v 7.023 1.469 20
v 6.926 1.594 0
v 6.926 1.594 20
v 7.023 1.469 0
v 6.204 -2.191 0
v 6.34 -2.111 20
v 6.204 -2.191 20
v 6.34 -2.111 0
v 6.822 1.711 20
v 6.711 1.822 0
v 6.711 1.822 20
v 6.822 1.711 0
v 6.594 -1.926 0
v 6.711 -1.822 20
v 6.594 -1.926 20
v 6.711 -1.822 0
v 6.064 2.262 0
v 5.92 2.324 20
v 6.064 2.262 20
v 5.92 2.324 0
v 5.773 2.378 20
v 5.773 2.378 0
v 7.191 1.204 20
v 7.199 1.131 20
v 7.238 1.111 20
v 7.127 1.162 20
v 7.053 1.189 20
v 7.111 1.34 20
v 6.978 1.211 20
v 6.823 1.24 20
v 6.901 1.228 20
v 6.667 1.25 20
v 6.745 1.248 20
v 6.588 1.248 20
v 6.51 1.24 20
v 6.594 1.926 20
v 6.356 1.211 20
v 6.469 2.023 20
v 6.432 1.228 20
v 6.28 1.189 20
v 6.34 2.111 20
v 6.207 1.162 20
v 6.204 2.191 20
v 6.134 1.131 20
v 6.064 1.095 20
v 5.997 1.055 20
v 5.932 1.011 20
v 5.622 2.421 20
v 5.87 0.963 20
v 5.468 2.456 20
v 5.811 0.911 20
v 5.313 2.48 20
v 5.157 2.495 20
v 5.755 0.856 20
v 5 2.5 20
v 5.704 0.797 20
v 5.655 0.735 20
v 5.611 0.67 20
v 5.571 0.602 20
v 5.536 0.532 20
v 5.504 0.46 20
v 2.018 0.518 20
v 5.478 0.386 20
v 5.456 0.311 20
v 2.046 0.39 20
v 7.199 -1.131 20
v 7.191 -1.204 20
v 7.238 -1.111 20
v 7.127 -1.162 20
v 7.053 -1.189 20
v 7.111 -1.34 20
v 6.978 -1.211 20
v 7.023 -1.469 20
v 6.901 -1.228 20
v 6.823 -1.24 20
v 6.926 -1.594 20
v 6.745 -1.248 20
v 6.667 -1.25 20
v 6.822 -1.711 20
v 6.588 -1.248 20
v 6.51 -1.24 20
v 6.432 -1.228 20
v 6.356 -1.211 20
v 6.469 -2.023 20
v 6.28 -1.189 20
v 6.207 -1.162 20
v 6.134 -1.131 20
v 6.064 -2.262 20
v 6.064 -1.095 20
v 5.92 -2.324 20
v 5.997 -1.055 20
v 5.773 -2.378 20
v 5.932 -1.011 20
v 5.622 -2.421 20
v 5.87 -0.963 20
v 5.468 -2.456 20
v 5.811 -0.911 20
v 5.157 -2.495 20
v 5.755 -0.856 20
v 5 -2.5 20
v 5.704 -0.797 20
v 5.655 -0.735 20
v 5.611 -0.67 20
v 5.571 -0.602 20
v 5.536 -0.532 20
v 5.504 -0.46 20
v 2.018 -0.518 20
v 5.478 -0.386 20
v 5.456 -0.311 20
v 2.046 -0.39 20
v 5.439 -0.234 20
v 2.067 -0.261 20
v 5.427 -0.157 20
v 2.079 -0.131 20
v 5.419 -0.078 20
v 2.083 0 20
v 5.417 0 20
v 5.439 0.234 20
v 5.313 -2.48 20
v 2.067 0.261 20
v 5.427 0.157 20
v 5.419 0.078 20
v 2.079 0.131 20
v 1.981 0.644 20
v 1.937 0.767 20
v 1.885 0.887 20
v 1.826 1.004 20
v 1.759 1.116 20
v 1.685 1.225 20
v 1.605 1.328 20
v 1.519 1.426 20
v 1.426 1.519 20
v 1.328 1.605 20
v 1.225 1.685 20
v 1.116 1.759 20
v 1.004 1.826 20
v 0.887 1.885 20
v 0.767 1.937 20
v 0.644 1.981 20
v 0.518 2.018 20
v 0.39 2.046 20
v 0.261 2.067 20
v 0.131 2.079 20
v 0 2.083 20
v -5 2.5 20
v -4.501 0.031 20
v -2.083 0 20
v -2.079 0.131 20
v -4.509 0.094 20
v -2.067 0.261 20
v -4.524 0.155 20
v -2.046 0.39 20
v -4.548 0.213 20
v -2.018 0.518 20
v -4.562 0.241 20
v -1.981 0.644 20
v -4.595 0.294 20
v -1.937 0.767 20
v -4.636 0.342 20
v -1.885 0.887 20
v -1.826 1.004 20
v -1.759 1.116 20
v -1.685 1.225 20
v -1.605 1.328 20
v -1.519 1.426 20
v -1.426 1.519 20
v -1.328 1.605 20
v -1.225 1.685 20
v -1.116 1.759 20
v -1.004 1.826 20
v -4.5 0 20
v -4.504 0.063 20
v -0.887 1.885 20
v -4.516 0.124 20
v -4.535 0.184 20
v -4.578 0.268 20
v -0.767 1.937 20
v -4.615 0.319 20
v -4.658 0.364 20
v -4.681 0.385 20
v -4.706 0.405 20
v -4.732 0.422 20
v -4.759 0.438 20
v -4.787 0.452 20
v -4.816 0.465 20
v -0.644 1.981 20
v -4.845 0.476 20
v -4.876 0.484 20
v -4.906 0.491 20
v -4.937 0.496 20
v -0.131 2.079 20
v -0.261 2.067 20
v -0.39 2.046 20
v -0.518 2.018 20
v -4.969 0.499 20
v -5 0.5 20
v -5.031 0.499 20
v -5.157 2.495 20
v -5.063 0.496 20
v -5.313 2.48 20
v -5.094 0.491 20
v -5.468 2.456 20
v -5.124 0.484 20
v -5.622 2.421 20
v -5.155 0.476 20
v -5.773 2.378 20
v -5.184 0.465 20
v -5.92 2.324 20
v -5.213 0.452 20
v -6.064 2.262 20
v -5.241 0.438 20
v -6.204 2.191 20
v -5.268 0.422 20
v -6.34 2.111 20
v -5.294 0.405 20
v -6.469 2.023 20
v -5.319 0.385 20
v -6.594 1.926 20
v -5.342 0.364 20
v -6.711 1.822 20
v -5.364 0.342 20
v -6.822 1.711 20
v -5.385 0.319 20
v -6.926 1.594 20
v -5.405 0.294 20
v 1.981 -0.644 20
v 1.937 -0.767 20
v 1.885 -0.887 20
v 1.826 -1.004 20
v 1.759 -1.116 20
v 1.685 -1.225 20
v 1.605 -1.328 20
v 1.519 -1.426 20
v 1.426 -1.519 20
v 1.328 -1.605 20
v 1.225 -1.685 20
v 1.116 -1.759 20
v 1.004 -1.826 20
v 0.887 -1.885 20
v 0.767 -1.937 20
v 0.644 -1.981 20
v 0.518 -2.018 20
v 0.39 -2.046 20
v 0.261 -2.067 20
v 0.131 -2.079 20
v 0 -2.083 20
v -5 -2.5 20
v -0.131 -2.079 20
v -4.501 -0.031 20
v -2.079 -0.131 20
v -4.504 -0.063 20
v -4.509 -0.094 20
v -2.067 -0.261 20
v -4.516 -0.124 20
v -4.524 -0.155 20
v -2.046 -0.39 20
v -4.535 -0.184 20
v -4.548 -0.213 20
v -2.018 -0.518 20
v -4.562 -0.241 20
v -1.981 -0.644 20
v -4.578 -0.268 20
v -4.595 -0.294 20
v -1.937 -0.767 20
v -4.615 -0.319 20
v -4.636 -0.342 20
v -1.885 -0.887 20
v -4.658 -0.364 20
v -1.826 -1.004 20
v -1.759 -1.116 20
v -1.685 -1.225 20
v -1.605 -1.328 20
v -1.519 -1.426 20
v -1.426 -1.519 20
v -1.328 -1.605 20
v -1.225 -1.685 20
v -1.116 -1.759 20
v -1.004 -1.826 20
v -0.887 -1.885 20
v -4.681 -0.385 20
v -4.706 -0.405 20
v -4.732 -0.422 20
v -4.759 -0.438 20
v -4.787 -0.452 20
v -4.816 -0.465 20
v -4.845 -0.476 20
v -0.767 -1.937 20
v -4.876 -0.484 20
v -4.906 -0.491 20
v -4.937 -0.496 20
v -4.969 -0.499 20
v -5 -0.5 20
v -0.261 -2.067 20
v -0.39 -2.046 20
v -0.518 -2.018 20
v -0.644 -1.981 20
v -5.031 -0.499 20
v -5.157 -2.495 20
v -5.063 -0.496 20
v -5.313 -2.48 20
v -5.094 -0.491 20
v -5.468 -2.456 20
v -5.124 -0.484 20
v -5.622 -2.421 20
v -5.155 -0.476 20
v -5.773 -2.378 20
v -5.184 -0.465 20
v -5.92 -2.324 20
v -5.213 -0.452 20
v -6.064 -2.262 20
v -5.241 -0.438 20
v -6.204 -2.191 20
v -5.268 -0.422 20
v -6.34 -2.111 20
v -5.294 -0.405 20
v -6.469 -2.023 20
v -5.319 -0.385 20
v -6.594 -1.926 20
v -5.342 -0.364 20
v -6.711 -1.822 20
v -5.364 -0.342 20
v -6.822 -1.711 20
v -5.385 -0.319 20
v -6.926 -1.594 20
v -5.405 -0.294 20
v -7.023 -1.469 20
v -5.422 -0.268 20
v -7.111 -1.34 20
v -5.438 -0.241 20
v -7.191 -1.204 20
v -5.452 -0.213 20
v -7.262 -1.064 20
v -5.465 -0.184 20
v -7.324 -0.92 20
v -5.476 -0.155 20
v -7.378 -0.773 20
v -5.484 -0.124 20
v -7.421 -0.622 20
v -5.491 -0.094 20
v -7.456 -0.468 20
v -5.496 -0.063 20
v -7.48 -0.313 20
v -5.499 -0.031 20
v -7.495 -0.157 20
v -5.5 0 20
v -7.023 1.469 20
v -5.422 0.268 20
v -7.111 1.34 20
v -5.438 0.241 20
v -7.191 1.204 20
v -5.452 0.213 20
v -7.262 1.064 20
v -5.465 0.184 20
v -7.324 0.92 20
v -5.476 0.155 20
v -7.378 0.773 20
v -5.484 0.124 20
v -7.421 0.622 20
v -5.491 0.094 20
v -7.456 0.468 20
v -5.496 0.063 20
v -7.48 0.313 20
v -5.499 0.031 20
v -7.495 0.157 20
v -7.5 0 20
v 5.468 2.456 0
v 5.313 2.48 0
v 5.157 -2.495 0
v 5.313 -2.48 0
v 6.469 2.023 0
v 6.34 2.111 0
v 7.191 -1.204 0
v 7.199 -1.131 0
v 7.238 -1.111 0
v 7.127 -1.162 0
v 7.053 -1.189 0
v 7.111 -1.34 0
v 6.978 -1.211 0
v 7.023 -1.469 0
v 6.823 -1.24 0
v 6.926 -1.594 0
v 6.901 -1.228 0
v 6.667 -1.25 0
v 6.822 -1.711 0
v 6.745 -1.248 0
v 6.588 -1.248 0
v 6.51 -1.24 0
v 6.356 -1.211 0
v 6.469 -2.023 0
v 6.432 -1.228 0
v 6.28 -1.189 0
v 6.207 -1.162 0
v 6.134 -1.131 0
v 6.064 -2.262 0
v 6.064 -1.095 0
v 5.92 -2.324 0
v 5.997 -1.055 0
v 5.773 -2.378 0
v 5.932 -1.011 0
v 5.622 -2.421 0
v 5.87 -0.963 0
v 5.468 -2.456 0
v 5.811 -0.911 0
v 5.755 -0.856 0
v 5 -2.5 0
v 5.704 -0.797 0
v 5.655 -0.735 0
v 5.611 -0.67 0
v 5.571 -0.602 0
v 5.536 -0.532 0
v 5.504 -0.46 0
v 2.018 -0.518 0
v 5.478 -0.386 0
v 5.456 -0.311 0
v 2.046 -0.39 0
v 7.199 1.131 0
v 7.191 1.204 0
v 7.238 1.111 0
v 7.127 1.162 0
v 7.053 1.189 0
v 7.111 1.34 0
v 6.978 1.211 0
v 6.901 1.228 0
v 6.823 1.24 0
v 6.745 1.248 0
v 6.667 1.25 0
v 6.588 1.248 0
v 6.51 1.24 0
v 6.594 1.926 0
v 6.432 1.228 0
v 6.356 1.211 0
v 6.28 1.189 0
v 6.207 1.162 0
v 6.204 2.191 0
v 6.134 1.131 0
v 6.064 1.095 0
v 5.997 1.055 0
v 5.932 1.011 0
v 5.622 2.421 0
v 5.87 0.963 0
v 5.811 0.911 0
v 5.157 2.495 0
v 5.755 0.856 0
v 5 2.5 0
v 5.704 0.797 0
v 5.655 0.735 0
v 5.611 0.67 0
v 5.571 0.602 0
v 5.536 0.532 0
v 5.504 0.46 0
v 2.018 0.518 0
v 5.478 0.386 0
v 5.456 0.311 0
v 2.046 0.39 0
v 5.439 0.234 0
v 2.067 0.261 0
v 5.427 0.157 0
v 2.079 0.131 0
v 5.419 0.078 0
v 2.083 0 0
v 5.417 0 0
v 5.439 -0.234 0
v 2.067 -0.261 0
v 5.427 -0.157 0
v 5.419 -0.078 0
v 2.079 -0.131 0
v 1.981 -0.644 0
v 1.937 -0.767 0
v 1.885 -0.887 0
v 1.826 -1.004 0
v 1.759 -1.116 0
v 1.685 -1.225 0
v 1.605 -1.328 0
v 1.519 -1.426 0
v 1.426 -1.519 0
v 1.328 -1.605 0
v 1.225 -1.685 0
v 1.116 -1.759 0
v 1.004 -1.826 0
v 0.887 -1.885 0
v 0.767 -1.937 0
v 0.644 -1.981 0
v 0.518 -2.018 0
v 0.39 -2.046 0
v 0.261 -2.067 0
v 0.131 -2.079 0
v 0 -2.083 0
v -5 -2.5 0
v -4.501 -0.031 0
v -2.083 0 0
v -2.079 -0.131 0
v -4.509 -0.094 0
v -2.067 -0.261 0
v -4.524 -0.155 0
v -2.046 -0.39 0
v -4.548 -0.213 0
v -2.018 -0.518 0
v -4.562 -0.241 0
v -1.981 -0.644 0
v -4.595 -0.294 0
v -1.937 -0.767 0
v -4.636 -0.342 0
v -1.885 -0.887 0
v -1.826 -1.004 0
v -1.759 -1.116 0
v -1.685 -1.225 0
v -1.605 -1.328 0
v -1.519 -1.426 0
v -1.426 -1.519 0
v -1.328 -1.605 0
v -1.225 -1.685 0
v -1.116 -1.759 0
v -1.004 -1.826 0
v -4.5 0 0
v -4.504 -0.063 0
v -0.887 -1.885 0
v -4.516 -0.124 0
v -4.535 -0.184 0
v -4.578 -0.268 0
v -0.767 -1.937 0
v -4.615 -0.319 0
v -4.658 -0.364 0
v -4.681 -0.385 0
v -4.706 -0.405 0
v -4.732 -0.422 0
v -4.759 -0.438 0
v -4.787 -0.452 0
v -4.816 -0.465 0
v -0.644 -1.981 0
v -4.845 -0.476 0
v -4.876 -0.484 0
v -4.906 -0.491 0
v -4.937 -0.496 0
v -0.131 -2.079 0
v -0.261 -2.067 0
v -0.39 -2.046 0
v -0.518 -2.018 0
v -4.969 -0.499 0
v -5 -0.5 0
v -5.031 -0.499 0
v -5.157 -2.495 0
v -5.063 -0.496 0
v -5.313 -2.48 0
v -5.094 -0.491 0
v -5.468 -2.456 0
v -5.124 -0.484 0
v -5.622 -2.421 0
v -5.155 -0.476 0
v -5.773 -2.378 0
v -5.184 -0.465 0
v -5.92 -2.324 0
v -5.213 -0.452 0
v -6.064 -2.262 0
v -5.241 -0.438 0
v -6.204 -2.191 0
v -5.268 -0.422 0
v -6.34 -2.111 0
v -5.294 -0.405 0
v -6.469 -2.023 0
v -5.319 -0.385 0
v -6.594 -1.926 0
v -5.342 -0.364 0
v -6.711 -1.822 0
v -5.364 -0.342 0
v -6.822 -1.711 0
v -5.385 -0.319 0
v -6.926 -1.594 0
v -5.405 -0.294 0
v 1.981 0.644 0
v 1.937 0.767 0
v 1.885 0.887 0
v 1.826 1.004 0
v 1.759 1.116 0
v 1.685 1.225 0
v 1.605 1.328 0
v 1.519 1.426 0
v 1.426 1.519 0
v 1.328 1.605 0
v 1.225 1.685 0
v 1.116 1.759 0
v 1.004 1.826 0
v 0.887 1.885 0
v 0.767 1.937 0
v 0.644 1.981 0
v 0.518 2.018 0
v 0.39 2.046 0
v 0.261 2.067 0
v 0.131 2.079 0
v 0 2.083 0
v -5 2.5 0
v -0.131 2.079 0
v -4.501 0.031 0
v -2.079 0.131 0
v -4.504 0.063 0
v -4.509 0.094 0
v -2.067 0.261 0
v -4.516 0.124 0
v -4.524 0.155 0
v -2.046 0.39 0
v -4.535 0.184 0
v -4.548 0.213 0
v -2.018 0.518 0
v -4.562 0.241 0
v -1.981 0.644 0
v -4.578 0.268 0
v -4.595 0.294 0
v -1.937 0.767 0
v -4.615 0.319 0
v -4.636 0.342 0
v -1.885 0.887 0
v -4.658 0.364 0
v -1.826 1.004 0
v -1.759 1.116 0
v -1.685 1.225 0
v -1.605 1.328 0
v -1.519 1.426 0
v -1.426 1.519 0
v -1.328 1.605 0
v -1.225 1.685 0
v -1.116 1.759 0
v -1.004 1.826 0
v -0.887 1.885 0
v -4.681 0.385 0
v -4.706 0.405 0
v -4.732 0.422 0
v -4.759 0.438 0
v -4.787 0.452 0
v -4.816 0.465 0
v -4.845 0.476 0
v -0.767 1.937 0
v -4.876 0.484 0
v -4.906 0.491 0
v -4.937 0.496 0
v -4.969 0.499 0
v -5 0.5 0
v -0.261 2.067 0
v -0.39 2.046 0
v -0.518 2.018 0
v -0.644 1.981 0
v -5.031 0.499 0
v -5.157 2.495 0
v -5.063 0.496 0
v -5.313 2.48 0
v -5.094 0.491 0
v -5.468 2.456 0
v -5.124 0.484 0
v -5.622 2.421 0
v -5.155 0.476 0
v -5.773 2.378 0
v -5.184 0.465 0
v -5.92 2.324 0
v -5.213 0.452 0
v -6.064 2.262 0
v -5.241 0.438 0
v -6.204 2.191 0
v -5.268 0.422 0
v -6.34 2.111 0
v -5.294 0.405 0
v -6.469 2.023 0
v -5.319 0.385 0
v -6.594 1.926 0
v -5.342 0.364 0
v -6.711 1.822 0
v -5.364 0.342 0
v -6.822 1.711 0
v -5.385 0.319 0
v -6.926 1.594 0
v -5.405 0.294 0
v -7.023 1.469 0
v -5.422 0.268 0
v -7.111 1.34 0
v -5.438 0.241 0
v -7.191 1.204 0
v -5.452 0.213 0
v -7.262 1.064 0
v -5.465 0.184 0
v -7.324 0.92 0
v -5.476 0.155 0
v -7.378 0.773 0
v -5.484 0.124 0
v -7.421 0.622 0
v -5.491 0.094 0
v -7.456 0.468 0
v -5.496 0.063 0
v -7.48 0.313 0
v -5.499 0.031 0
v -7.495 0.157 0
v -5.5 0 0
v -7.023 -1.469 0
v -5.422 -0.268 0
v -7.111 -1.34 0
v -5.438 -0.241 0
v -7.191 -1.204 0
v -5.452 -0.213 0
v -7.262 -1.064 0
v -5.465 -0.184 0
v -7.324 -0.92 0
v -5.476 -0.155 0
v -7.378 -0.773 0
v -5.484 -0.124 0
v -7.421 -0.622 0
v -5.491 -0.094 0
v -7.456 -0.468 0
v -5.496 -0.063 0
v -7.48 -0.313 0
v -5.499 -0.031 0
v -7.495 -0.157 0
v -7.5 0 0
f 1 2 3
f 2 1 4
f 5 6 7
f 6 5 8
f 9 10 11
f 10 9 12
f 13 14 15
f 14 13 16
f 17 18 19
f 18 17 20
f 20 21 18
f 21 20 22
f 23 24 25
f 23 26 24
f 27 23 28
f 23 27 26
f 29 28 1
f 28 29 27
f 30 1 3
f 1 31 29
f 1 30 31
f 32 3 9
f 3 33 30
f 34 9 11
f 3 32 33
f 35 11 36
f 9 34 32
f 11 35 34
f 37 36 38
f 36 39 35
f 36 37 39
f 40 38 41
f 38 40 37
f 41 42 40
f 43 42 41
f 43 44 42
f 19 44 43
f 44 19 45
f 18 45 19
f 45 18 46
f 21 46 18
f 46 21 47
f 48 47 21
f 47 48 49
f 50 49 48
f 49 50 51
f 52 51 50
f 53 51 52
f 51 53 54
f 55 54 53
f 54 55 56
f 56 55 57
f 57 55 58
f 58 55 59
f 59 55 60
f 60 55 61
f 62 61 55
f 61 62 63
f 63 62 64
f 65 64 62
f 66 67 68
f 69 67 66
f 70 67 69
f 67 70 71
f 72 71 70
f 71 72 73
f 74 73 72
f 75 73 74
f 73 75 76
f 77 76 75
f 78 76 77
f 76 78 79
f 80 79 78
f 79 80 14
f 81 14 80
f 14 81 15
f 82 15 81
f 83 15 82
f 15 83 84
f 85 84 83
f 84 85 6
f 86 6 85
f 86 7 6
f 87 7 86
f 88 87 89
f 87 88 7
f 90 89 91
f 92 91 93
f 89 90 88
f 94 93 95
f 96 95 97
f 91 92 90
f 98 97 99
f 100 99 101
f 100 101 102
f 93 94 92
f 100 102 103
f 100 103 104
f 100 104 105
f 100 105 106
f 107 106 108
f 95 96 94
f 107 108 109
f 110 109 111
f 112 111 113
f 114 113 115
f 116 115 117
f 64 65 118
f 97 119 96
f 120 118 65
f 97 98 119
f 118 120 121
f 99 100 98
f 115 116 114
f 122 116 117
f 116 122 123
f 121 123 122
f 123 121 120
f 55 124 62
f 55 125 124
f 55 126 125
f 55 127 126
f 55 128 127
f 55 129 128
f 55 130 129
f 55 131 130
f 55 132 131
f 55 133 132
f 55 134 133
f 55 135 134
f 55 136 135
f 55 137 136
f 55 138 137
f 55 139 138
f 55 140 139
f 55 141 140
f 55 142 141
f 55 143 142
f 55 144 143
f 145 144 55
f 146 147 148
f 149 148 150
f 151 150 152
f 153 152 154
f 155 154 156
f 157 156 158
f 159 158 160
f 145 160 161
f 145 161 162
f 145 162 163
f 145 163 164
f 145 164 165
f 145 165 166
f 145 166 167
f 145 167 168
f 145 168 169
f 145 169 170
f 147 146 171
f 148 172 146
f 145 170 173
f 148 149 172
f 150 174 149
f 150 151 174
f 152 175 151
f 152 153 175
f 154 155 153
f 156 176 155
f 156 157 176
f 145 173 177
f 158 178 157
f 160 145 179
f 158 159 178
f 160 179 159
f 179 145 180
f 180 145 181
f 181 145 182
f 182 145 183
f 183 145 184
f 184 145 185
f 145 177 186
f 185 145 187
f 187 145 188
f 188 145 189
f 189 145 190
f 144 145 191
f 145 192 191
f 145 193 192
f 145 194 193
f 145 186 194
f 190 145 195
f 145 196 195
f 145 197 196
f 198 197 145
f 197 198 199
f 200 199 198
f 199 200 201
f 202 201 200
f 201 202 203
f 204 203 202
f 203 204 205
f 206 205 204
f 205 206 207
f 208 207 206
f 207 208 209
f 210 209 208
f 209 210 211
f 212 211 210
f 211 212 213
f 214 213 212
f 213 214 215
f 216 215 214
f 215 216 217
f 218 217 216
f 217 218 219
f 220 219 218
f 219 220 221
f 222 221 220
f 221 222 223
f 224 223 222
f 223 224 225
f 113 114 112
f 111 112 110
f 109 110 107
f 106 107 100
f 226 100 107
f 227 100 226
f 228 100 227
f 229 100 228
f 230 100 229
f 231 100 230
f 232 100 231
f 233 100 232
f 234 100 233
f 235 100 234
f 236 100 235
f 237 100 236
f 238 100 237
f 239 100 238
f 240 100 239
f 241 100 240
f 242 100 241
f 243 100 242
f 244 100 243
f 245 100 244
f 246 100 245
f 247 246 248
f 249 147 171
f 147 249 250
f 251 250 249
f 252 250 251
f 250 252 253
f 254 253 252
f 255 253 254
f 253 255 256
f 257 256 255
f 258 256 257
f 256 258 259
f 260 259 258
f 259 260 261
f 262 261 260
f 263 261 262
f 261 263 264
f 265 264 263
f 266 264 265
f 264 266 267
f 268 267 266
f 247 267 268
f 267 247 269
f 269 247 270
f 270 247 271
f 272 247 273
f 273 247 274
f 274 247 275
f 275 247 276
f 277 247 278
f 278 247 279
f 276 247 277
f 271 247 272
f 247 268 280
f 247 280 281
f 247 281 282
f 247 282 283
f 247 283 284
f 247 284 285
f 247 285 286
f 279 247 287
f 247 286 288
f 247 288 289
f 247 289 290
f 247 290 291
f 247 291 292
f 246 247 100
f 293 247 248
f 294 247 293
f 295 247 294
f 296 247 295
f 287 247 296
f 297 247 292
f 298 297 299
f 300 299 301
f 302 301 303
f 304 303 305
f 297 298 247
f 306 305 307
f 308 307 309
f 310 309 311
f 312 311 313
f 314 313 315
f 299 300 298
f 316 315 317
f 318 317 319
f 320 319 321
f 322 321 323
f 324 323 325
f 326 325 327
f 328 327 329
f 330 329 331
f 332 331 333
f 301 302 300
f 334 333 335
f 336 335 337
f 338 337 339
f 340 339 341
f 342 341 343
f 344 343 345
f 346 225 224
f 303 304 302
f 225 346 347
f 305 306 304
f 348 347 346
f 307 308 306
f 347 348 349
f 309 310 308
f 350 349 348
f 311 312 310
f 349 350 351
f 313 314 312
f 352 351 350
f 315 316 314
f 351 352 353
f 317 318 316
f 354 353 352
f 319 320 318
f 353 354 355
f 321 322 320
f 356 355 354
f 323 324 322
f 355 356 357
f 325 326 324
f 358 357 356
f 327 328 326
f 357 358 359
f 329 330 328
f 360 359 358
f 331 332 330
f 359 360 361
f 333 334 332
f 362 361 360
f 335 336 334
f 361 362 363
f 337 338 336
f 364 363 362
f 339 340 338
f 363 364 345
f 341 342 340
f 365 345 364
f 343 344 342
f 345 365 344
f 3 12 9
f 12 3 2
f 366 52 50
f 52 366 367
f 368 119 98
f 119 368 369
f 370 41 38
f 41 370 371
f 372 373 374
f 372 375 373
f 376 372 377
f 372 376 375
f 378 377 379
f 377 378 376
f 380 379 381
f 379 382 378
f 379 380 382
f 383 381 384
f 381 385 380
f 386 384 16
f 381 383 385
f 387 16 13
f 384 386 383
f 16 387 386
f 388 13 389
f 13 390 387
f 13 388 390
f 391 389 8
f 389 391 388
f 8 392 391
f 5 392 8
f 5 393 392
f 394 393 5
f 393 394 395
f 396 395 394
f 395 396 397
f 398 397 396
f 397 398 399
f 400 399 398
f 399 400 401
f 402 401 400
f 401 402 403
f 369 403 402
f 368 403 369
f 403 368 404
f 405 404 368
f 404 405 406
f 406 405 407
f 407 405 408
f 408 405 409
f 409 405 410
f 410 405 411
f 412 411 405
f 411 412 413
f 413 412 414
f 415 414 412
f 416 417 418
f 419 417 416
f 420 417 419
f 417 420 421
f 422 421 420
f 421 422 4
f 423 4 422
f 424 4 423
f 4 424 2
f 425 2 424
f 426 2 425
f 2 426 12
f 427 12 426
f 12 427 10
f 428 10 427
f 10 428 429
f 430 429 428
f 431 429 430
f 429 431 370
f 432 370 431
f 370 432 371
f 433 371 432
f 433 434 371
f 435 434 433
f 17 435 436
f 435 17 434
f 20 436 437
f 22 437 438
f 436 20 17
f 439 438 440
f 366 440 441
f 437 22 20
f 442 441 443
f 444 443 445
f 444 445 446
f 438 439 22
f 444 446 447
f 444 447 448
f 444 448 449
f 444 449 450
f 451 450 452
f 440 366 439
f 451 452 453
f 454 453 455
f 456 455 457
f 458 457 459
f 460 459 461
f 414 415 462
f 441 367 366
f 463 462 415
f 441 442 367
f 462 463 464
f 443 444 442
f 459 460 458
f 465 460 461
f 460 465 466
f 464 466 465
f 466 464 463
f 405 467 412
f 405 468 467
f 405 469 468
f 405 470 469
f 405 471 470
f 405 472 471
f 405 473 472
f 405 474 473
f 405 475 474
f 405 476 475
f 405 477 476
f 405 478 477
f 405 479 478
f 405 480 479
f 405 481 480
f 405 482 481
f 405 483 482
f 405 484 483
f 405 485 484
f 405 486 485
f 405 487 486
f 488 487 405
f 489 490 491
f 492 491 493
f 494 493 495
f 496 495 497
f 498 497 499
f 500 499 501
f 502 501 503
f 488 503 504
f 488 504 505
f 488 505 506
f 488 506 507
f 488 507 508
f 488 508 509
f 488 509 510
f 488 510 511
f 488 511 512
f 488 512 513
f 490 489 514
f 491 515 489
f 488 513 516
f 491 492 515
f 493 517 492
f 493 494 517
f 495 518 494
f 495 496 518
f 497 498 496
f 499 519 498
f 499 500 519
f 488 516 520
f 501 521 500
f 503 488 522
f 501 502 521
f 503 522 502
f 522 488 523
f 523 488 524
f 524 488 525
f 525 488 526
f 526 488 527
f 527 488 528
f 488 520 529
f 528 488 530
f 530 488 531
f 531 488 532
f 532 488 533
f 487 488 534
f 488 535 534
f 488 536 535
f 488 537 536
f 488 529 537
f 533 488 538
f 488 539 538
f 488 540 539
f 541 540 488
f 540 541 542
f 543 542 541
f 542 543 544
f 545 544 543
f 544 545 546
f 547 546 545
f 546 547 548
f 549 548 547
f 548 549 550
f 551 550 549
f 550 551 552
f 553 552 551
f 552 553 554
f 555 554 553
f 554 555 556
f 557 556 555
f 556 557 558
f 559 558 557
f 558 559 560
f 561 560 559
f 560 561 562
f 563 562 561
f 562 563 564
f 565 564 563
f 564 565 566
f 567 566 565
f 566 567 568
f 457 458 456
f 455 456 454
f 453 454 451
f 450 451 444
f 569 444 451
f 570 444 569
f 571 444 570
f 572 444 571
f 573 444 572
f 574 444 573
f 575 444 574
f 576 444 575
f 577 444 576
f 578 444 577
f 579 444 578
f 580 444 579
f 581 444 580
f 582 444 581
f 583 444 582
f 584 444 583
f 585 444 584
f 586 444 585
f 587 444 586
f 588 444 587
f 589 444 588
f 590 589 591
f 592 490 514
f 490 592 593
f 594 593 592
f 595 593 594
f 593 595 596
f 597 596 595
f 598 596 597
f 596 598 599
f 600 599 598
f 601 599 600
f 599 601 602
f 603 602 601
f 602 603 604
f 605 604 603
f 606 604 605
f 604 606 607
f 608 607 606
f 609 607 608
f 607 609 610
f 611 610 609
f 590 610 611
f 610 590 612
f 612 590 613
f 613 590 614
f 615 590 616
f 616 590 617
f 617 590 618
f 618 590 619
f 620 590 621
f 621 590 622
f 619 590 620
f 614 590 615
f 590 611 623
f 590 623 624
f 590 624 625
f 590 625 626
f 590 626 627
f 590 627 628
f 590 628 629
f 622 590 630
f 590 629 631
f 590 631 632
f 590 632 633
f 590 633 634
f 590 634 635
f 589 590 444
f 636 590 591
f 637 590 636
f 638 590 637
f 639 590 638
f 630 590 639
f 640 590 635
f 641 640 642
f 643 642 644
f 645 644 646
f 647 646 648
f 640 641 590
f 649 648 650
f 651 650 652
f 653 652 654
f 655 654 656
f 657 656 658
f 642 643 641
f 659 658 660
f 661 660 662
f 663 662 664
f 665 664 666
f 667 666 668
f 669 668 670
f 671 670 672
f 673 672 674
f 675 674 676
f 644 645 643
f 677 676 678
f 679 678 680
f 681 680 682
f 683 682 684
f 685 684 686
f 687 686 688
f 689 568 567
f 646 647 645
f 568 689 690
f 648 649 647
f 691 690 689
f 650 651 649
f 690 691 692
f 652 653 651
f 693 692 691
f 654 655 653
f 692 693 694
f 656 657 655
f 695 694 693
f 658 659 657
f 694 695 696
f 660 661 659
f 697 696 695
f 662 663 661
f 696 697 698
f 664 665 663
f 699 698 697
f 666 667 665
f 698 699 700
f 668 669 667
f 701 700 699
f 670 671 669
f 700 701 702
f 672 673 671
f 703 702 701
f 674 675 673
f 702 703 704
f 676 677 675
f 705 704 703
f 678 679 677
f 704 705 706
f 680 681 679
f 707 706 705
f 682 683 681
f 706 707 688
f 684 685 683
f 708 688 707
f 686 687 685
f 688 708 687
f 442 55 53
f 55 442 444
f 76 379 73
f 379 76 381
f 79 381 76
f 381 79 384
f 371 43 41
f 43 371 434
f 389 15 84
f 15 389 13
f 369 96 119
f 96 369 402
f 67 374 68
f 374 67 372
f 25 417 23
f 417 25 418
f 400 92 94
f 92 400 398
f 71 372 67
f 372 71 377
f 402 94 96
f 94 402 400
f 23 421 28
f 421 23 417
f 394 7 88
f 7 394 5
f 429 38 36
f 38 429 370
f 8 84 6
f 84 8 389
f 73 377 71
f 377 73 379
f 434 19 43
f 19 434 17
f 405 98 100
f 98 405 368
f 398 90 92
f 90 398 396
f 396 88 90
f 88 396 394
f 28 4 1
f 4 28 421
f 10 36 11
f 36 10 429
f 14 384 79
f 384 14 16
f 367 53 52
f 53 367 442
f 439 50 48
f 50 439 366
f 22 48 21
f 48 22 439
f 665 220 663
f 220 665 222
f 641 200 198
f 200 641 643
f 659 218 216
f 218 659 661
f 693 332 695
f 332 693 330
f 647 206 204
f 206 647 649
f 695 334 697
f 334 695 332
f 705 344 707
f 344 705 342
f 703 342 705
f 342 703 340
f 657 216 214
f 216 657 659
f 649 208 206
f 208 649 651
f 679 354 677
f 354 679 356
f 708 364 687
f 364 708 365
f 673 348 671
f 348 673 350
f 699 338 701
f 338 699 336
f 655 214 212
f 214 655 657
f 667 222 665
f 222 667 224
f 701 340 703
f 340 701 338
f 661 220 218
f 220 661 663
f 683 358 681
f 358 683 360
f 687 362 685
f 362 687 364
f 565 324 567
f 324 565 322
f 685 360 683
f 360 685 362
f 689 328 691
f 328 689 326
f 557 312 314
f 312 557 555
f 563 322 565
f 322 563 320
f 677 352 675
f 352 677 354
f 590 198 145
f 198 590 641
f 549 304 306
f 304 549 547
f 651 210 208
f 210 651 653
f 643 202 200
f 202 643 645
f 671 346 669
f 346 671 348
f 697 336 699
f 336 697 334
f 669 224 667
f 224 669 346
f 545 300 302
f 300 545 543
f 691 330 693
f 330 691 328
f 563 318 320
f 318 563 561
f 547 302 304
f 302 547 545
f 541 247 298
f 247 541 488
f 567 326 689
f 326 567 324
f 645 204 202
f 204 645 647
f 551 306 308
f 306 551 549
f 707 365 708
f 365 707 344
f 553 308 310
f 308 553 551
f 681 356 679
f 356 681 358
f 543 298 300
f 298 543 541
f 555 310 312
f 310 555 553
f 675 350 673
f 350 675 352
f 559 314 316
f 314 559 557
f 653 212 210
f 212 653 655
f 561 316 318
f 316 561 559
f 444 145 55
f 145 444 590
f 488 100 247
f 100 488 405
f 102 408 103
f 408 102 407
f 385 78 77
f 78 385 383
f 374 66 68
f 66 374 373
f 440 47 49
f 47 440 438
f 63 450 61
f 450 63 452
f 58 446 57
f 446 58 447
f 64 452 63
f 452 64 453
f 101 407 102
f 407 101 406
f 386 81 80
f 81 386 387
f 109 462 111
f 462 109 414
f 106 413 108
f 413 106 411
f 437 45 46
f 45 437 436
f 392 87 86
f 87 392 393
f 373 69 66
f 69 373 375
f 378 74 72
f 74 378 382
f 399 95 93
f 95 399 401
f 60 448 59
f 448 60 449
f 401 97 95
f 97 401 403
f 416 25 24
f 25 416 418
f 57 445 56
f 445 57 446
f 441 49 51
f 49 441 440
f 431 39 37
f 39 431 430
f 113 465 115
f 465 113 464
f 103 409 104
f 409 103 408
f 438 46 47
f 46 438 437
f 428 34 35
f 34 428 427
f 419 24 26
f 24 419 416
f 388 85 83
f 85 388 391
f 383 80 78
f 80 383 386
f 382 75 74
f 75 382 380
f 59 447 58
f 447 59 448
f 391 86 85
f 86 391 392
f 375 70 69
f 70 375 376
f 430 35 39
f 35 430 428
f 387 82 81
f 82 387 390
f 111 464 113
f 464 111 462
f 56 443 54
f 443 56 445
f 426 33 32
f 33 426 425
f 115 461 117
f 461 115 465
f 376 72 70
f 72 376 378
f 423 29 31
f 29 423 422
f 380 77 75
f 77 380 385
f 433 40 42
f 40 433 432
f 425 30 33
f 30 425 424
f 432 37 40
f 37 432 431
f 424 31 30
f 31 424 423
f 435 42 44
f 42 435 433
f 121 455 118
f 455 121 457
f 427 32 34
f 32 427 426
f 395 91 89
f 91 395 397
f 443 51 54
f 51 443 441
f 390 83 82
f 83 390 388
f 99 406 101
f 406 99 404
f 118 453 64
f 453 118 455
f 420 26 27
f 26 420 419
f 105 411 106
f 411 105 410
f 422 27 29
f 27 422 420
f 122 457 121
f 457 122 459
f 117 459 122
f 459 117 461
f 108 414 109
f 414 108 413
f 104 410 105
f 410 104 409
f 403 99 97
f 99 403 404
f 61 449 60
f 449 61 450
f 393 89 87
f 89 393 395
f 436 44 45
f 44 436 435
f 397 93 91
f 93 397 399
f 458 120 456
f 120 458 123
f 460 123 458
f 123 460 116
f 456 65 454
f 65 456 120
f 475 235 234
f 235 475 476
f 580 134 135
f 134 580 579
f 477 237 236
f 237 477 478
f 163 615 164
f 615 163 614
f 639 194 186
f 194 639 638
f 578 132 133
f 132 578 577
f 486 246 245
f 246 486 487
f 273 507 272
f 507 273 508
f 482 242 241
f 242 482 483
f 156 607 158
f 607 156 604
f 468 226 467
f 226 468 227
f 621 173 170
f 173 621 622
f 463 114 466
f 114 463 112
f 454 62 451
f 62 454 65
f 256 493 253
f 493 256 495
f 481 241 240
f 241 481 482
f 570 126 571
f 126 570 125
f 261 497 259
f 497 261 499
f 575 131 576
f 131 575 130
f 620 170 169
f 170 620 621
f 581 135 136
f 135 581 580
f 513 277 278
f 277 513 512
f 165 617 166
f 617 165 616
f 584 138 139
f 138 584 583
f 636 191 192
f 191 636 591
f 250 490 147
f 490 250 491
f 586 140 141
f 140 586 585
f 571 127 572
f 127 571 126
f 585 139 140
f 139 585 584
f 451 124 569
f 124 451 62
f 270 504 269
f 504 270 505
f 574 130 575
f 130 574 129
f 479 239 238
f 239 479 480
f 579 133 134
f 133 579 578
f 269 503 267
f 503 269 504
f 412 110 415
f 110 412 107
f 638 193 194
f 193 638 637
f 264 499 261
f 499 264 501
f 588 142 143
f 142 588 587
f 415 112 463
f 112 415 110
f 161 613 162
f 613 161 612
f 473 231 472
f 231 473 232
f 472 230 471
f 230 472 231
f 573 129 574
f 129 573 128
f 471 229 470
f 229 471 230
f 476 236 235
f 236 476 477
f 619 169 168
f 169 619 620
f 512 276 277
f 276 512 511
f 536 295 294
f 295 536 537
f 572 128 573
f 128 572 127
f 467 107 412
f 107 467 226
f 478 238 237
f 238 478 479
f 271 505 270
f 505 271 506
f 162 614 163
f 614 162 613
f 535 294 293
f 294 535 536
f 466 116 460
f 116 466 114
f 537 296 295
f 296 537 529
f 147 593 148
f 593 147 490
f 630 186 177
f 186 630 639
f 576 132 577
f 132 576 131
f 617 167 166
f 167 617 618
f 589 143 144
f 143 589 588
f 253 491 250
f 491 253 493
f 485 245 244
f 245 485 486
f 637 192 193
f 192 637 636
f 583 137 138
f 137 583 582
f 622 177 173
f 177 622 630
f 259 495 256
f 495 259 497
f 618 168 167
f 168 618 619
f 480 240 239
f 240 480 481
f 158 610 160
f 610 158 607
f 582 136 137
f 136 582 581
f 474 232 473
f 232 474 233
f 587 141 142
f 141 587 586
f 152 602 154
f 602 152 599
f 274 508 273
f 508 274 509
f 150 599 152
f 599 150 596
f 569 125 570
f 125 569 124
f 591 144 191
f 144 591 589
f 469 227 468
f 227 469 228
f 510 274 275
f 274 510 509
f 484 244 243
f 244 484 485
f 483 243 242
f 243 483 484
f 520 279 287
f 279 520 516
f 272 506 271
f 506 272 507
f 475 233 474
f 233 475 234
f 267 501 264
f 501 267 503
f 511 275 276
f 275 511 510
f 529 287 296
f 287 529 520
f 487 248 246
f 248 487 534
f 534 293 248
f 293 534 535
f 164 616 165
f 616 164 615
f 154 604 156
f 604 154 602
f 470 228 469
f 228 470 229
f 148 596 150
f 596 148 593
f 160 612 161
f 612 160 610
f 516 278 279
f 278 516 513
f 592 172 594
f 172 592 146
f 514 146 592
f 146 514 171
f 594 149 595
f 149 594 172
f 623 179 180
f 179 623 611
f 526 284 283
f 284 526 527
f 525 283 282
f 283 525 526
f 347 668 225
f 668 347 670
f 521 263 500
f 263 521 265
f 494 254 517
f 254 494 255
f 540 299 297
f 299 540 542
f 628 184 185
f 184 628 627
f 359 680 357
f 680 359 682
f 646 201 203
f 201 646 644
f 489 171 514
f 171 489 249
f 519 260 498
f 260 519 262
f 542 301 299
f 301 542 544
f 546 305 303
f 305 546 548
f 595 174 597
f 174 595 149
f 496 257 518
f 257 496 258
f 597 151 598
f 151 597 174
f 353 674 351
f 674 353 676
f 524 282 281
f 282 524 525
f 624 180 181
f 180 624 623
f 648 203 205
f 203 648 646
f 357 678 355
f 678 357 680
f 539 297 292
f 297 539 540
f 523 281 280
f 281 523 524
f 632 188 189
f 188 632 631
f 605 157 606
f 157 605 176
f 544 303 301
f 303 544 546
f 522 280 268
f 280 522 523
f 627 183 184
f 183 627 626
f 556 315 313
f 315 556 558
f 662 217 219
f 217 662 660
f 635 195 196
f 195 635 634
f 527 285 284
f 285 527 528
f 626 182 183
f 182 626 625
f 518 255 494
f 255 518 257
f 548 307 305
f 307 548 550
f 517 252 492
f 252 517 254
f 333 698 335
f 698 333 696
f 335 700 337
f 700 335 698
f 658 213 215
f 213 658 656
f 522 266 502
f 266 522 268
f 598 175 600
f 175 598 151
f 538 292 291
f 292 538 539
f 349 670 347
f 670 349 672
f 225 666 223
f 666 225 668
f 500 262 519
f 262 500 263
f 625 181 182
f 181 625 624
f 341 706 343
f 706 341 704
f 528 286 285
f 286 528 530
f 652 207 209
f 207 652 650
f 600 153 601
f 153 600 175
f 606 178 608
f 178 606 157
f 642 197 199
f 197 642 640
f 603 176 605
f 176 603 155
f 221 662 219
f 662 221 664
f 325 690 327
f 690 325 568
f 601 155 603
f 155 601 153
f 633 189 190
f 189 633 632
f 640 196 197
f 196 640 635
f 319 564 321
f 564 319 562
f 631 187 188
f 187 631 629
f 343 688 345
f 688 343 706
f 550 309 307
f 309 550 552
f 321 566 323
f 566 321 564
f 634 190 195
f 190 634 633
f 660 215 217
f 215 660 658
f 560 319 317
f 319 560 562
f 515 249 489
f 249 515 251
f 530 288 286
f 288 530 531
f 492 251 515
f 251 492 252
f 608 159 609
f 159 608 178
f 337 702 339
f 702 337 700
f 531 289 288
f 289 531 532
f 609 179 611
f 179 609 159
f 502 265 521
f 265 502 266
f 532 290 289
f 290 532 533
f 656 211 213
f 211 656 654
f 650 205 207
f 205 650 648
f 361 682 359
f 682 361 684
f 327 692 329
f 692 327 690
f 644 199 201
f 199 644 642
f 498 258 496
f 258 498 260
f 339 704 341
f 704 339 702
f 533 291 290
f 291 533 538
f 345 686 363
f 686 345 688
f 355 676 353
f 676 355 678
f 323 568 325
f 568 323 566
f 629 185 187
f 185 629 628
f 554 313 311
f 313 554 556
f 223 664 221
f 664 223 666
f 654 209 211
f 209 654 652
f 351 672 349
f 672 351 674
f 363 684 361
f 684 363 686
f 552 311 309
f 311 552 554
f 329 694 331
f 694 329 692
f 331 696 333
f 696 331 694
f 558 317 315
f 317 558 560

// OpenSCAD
height = 20;
width = 5;

smoothness = 100;

extra_height = 2;

difference(){
    union(){
        translate([5,0,0]) cylinder(height, d=width, $fn=smoothness);
        translate([-5,0,0]) cylinder(height, d=width, $fn=smoothness);
        translate([-5,-width/2,0]) cube([10,width,height]);
    }
    

    translate([0,0,-extra_height/2]) {
        translate([5+width/3,0,0]) cylinder(height+extra_height, d=width/2, $fn=smoothness);
        cylinder(height+extra_height, d=width/1.20, $fn=smoothness);
        translate([-5,0,0]) cylinder(height+extra_height, d=1, $fn=smoothness);
    }
}
